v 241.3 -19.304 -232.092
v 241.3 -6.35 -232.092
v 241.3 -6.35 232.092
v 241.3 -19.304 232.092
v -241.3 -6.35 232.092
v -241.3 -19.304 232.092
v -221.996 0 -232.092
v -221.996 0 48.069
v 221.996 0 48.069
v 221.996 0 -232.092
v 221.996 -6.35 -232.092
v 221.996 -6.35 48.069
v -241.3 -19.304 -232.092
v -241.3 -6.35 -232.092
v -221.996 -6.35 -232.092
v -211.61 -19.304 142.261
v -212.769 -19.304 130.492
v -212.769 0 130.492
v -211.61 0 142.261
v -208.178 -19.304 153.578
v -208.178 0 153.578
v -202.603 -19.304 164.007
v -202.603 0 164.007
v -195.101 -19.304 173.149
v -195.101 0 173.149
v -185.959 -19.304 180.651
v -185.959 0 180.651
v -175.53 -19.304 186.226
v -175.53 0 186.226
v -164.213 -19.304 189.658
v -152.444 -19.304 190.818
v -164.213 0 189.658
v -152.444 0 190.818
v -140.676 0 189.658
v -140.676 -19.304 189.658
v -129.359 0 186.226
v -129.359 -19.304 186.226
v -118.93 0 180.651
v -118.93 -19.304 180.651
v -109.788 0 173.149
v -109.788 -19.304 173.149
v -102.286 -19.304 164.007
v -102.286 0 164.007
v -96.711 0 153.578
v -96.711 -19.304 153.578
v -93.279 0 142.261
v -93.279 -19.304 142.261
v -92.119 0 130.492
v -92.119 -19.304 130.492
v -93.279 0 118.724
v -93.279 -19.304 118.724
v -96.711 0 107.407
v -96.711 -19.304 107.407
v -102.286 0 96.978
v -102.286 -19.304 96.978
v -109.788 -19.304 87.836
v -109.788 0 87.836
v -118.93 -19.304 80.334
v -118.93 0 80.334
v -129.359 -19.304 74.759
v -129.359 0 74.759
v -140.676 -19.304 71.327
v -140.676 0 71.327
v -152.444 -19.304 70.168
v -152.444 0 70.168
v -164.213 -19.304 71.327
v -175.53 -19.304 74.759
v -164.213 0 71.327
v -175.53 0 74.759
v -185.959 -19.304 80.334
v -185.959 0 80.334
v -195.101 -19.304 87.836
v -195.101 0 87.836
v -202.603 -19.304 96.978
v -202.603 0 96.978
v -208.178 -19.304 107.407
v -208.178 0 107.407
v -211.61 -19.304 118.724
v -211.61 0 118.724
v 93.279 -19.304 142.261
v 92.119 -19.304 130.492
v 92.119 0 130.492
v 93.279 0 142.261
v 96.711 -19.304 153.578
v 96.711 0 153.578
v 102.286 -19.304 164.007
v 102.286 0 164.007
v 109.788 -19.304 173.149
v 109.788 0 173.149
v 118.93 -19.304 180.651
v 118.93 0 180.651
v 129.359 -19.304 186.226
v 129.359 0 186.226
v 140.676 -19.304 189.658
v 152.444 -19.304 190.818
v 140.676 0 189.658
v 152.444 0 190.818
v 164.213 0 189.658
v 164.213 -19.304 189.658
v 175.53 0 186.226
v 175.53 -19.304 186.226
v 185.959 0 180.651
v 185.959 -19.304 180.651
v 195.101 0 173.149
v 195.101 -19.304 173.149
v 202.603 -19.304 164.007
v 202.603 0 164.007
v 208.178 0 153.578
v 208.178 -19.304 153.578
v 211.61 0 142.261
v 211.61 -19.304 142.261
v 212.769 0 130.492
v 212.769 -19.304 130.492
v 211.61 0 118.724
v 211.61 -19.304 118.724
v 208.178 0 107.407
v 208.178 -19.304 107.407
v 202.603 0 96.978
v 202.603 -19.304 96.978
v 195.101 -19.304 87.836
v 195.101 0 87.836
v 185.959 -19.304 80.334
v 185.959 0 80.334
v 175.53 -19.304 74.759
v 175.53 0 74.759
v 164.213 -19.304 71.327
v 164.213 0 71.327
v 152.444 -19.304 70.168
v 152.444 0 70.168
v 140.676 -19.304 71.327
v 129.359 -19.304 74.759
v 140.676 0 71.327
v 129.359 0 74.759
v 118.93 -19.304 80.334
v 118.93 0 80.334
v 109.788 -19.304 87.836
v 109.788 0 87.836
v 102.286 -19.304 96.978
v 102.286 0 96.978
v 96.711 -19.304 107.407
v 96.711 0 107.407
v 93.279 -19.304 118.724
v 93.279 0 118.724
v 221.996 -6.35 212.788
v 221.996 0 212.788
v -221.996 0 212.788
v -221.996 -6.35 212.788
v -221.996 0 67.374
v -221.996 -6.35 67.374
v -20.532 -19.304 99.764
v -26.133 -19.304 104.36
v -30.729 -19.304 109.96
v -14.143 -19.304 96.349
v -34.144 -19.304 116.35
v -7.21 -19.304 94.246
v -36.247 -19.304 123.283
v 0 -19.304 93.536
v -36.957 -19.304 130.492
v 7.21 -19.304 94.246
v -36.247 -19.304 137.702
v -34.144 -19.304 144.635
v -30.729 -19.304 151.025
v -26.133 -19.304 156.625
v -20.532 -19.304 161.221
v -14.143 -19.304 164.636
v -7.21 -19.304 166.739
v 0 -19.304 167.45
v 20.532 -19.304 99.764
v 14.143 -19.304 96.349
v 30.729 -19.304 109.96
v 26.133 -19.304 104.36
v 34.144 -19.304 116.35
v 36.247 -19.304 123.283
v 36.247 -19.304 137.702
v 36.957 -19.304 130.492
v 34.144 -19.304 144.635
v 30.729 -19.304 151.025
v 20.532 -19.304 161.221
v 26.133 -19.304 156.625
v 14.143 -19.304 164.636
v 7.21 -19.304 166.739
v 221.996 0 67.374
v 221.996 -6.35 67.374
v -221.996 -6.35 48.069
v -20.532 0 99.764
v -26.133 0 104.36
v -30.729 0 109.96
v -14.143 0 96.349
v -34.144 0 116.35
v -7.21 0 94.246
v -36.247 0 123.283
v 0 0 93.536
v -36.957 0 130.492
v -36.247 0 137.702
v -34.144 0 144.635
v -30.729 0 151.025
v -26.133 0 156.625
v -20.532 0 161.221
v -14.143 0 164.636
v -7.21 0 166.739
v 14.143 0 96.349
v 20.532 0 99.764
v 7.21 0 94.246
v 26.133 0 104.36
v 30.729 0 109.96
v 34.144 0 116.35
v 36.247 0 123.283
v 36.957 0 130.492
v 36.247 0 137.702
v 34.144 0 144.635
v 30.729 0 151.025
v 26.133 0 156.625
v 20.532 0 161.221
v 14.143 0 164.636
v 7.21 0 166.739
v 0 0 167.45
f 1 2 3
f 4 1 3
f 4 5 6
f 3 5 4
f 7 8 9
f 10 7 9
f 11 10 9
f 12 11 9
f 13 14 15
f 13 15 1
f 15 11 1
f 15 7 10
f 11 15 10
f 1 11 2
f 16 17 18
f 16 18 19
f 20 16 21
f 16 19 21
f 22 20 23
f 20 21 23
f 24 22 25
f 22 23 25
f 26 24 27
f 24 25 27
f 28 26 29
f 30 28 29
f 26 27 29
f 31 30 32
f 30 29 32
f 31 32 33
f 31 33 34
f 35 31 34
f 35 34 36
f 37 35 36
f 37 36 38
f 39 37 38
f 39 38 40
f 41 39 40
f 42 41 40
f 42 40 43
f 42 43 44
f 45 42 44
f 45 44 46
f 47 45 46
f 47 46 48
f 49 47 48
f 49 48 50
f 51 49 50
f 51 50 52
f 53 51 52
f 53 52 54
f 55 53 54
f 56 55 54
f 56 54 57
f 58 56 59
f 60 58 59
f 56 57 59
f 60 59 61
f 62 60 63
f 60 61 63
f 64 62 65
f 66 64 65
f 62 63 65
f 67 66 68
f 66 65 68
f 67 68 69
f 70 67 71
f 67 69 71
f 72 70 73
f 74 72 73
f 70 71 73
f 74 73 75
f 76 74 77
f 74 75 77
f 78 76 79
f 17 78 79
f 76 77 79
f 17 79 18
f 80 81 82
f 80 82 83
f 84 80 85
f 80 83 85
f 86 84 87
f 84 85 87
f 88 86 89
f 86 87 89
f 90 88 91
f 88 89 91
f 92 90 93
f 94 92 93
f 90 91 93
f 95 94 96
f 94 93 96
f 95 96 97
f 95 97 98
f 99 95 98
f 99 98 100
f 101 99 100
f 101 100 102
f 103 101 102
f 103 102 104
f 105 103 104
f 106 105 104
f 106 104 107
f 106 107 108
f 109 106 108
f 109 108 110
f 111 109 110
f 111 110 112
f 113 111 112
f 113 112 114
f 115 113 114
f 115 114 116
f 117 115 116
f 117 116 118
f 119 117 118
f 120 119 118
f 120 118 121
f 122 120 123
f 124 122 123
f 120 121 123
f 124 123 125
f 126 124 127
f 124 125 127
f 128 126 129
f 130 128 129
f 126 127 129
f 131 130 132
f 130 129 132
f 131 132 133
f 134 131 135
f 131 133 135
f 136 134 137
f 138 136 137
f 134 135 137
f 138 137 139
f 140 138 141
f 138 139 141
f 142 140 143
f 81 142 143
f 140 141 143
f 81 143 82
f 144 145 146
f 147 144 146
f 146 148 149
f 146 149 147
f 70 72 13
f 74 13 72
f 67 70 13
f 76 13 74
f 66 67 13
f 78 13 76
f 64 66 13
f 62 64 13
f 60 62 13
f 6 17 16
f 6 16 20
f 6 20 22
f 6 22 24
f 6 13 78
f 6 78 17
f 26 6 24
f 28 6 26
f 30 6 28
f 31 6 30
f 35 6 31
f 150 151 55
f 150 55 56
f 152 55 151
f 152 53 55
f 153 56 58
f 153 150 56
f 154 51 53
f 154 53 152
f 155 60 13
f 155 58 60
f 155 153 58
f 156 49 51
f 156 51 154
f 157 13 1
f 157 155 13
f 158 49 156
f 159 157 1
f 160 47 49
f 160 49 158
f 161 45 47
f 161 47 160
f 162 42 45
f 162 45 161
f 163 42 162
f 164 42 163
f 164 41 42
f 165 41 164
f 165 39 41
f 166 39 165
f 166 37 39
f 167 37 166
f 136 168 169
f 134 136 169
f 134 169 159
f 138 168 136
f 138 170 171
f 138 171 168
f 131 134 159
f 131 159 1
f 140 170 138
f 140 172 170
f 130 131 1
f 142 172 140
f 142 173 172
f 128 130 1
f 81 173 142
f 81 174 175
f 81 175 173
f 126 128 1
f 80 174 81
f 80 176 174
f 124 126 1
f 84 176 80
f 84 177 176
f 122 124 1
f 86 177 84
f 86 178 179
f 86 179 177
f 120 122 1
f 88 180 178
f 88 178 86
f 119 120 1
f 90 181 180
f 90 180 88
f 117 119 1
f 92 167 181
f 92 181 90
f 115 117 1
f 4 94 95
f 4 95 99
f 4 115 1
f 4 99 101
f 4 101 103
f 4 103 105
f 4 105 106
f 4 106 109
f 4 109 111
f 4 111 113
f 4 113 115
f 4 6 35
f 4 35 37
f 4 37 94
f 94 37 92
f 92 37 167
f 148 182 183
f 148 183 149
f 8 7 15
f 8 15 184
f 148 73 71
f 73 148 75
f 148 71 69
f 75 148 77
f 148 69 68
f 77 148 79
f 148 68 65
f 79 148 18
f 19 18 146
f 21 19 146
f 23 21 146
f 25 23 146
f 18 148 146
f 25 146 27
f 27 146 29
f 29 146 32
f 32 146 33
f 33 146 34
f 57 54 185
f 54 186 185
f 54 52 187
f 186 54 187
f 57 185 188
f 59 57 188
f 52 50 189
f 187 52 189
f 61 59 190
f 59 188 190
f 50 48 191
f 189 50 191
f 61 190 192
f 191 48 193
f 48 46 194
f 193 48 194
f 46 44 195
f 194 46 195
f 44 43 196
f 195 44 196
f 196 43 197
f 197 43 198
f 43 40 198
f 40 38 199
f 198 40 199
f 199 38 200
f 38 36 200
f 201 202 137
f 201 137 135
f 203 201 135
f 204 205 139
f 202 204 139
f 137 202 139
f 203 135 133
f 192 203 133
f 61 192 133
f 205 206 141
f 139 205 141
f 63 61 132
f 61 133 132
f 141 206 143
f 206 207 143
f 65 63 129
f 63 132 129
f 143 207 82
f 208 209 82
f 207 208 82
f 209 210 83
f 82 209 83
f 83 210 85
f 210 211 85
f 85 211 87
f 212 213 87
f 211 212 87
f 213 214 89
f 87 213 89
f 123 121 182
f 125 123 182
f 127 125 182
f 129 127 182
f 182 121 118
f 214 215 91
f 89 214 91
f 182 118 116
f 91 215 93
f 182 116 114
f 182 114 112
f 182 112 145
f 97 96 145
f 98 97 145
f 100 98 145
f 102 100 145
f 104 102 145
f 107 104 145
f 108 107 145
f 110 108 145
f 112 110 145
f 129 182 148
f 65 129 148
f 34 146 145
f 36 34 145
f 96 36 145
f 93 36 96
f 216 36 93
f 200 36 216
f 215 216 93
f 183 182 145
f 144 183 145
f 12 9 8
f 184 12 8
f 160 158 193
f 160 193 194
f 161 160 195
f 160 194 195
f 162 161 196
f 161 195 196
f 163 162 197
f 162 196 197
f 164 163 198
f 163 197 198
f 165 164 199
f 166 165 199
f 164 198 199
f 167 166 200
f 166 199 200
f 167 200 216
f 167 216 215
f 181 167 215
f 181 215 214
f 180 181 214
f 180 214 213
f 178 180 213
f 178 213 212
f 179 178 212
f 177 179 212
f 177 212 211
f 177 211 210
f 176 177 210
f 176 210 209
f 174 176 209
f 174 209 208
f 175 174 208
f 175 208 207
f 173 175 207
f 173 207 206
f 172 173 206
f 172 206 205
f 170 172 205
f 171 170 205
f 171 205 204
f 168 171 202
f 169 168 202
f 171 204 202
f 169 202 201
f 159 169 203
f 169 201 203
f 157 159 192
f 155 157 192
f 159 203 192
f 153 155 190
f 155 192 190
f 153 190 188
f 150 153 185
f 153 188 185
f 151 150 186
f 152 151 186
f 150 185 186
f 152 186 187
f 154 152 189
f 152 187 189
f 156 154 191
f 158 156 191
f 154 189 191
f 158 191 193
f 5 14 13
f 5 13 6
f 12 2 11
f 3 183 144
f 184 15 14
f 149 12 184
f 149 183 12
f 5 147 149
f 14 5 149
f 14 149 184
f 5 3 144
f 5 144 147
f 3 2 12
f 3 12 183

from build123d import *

# Parameters (mm, degrees)
F0_W     = 482.6
F0_H     = 464.185
F1_DEPTH = 19.304
F3_D     = 73.914
F4_D     = 120.65
F5_W     = 19.304
F5_H     = 19.304
F5_W_2   = 443.992
F5_H_2   = 145.415
F5_H_3   = 280.162
F6_DEPTH = 6.35


with BuildPart() as f1:
    # F0 (on Front) → F1 (new body)
    with BuildSketch(Plane.XZ):
        Rectangle(F0_W, F0_H)
    extrude(amount=F1_DEPTH)

    # F3 (through all)
    with Locations(Plane.XZ.offset(19.304)):
        with Locations((0, 130.4925)):
            Hole(F3_D / 2)

    # F4 (through all)
    with Locations(Plane.XZ.offset(19.304)):
        with Locations((-152.444478, 130.4925), (152.444478, 130.4925)):
            Hole(F4_D / 2)

    # F5 (on face) → F6 (cut)
    with BuildSketch(Plane(origin=(0, 0, 0), x_dir=(-1, 0, 0), z_dir=(0, 1, 0))):
        with Locations((-231.648, 222.4405)):
            Rectangle(F5_W, F5_H)
        with Locations((0, 222.4405)):
            Rectangle(F5_W_2, F5_H)
        with Locations((-231.648, 140.081)):
            Rectangle(F5_W, F5_H_2)
        with Locations((231.648, 222.4405)):
            Rectangle(F5_W, F5_H)
        with Locations((-231.648, 57.7215)):
            Rectangle(F5_W, F5_H)
        with Locations((0, 57.7215)):
            Rectangle(F5_W_2, F5_H)
        with Locations((231.648, 140.081)):
            Rectangle(F5_W, F5_H_2)
        with Locations((-231.648, -92.0115)):
            Rectangle(F5_W, F5_H_3)
        with Locations((231.648, 57.7215)):
            Rectangle(F5_W, F5_H)
        with Locations((231.648, -92.0115)):
            Rectangle(F5_W, F5_H_3)
    extrude(amount=-F6_DEPTH, mode=Mode.SUBTRACT)


solid = f1.part
